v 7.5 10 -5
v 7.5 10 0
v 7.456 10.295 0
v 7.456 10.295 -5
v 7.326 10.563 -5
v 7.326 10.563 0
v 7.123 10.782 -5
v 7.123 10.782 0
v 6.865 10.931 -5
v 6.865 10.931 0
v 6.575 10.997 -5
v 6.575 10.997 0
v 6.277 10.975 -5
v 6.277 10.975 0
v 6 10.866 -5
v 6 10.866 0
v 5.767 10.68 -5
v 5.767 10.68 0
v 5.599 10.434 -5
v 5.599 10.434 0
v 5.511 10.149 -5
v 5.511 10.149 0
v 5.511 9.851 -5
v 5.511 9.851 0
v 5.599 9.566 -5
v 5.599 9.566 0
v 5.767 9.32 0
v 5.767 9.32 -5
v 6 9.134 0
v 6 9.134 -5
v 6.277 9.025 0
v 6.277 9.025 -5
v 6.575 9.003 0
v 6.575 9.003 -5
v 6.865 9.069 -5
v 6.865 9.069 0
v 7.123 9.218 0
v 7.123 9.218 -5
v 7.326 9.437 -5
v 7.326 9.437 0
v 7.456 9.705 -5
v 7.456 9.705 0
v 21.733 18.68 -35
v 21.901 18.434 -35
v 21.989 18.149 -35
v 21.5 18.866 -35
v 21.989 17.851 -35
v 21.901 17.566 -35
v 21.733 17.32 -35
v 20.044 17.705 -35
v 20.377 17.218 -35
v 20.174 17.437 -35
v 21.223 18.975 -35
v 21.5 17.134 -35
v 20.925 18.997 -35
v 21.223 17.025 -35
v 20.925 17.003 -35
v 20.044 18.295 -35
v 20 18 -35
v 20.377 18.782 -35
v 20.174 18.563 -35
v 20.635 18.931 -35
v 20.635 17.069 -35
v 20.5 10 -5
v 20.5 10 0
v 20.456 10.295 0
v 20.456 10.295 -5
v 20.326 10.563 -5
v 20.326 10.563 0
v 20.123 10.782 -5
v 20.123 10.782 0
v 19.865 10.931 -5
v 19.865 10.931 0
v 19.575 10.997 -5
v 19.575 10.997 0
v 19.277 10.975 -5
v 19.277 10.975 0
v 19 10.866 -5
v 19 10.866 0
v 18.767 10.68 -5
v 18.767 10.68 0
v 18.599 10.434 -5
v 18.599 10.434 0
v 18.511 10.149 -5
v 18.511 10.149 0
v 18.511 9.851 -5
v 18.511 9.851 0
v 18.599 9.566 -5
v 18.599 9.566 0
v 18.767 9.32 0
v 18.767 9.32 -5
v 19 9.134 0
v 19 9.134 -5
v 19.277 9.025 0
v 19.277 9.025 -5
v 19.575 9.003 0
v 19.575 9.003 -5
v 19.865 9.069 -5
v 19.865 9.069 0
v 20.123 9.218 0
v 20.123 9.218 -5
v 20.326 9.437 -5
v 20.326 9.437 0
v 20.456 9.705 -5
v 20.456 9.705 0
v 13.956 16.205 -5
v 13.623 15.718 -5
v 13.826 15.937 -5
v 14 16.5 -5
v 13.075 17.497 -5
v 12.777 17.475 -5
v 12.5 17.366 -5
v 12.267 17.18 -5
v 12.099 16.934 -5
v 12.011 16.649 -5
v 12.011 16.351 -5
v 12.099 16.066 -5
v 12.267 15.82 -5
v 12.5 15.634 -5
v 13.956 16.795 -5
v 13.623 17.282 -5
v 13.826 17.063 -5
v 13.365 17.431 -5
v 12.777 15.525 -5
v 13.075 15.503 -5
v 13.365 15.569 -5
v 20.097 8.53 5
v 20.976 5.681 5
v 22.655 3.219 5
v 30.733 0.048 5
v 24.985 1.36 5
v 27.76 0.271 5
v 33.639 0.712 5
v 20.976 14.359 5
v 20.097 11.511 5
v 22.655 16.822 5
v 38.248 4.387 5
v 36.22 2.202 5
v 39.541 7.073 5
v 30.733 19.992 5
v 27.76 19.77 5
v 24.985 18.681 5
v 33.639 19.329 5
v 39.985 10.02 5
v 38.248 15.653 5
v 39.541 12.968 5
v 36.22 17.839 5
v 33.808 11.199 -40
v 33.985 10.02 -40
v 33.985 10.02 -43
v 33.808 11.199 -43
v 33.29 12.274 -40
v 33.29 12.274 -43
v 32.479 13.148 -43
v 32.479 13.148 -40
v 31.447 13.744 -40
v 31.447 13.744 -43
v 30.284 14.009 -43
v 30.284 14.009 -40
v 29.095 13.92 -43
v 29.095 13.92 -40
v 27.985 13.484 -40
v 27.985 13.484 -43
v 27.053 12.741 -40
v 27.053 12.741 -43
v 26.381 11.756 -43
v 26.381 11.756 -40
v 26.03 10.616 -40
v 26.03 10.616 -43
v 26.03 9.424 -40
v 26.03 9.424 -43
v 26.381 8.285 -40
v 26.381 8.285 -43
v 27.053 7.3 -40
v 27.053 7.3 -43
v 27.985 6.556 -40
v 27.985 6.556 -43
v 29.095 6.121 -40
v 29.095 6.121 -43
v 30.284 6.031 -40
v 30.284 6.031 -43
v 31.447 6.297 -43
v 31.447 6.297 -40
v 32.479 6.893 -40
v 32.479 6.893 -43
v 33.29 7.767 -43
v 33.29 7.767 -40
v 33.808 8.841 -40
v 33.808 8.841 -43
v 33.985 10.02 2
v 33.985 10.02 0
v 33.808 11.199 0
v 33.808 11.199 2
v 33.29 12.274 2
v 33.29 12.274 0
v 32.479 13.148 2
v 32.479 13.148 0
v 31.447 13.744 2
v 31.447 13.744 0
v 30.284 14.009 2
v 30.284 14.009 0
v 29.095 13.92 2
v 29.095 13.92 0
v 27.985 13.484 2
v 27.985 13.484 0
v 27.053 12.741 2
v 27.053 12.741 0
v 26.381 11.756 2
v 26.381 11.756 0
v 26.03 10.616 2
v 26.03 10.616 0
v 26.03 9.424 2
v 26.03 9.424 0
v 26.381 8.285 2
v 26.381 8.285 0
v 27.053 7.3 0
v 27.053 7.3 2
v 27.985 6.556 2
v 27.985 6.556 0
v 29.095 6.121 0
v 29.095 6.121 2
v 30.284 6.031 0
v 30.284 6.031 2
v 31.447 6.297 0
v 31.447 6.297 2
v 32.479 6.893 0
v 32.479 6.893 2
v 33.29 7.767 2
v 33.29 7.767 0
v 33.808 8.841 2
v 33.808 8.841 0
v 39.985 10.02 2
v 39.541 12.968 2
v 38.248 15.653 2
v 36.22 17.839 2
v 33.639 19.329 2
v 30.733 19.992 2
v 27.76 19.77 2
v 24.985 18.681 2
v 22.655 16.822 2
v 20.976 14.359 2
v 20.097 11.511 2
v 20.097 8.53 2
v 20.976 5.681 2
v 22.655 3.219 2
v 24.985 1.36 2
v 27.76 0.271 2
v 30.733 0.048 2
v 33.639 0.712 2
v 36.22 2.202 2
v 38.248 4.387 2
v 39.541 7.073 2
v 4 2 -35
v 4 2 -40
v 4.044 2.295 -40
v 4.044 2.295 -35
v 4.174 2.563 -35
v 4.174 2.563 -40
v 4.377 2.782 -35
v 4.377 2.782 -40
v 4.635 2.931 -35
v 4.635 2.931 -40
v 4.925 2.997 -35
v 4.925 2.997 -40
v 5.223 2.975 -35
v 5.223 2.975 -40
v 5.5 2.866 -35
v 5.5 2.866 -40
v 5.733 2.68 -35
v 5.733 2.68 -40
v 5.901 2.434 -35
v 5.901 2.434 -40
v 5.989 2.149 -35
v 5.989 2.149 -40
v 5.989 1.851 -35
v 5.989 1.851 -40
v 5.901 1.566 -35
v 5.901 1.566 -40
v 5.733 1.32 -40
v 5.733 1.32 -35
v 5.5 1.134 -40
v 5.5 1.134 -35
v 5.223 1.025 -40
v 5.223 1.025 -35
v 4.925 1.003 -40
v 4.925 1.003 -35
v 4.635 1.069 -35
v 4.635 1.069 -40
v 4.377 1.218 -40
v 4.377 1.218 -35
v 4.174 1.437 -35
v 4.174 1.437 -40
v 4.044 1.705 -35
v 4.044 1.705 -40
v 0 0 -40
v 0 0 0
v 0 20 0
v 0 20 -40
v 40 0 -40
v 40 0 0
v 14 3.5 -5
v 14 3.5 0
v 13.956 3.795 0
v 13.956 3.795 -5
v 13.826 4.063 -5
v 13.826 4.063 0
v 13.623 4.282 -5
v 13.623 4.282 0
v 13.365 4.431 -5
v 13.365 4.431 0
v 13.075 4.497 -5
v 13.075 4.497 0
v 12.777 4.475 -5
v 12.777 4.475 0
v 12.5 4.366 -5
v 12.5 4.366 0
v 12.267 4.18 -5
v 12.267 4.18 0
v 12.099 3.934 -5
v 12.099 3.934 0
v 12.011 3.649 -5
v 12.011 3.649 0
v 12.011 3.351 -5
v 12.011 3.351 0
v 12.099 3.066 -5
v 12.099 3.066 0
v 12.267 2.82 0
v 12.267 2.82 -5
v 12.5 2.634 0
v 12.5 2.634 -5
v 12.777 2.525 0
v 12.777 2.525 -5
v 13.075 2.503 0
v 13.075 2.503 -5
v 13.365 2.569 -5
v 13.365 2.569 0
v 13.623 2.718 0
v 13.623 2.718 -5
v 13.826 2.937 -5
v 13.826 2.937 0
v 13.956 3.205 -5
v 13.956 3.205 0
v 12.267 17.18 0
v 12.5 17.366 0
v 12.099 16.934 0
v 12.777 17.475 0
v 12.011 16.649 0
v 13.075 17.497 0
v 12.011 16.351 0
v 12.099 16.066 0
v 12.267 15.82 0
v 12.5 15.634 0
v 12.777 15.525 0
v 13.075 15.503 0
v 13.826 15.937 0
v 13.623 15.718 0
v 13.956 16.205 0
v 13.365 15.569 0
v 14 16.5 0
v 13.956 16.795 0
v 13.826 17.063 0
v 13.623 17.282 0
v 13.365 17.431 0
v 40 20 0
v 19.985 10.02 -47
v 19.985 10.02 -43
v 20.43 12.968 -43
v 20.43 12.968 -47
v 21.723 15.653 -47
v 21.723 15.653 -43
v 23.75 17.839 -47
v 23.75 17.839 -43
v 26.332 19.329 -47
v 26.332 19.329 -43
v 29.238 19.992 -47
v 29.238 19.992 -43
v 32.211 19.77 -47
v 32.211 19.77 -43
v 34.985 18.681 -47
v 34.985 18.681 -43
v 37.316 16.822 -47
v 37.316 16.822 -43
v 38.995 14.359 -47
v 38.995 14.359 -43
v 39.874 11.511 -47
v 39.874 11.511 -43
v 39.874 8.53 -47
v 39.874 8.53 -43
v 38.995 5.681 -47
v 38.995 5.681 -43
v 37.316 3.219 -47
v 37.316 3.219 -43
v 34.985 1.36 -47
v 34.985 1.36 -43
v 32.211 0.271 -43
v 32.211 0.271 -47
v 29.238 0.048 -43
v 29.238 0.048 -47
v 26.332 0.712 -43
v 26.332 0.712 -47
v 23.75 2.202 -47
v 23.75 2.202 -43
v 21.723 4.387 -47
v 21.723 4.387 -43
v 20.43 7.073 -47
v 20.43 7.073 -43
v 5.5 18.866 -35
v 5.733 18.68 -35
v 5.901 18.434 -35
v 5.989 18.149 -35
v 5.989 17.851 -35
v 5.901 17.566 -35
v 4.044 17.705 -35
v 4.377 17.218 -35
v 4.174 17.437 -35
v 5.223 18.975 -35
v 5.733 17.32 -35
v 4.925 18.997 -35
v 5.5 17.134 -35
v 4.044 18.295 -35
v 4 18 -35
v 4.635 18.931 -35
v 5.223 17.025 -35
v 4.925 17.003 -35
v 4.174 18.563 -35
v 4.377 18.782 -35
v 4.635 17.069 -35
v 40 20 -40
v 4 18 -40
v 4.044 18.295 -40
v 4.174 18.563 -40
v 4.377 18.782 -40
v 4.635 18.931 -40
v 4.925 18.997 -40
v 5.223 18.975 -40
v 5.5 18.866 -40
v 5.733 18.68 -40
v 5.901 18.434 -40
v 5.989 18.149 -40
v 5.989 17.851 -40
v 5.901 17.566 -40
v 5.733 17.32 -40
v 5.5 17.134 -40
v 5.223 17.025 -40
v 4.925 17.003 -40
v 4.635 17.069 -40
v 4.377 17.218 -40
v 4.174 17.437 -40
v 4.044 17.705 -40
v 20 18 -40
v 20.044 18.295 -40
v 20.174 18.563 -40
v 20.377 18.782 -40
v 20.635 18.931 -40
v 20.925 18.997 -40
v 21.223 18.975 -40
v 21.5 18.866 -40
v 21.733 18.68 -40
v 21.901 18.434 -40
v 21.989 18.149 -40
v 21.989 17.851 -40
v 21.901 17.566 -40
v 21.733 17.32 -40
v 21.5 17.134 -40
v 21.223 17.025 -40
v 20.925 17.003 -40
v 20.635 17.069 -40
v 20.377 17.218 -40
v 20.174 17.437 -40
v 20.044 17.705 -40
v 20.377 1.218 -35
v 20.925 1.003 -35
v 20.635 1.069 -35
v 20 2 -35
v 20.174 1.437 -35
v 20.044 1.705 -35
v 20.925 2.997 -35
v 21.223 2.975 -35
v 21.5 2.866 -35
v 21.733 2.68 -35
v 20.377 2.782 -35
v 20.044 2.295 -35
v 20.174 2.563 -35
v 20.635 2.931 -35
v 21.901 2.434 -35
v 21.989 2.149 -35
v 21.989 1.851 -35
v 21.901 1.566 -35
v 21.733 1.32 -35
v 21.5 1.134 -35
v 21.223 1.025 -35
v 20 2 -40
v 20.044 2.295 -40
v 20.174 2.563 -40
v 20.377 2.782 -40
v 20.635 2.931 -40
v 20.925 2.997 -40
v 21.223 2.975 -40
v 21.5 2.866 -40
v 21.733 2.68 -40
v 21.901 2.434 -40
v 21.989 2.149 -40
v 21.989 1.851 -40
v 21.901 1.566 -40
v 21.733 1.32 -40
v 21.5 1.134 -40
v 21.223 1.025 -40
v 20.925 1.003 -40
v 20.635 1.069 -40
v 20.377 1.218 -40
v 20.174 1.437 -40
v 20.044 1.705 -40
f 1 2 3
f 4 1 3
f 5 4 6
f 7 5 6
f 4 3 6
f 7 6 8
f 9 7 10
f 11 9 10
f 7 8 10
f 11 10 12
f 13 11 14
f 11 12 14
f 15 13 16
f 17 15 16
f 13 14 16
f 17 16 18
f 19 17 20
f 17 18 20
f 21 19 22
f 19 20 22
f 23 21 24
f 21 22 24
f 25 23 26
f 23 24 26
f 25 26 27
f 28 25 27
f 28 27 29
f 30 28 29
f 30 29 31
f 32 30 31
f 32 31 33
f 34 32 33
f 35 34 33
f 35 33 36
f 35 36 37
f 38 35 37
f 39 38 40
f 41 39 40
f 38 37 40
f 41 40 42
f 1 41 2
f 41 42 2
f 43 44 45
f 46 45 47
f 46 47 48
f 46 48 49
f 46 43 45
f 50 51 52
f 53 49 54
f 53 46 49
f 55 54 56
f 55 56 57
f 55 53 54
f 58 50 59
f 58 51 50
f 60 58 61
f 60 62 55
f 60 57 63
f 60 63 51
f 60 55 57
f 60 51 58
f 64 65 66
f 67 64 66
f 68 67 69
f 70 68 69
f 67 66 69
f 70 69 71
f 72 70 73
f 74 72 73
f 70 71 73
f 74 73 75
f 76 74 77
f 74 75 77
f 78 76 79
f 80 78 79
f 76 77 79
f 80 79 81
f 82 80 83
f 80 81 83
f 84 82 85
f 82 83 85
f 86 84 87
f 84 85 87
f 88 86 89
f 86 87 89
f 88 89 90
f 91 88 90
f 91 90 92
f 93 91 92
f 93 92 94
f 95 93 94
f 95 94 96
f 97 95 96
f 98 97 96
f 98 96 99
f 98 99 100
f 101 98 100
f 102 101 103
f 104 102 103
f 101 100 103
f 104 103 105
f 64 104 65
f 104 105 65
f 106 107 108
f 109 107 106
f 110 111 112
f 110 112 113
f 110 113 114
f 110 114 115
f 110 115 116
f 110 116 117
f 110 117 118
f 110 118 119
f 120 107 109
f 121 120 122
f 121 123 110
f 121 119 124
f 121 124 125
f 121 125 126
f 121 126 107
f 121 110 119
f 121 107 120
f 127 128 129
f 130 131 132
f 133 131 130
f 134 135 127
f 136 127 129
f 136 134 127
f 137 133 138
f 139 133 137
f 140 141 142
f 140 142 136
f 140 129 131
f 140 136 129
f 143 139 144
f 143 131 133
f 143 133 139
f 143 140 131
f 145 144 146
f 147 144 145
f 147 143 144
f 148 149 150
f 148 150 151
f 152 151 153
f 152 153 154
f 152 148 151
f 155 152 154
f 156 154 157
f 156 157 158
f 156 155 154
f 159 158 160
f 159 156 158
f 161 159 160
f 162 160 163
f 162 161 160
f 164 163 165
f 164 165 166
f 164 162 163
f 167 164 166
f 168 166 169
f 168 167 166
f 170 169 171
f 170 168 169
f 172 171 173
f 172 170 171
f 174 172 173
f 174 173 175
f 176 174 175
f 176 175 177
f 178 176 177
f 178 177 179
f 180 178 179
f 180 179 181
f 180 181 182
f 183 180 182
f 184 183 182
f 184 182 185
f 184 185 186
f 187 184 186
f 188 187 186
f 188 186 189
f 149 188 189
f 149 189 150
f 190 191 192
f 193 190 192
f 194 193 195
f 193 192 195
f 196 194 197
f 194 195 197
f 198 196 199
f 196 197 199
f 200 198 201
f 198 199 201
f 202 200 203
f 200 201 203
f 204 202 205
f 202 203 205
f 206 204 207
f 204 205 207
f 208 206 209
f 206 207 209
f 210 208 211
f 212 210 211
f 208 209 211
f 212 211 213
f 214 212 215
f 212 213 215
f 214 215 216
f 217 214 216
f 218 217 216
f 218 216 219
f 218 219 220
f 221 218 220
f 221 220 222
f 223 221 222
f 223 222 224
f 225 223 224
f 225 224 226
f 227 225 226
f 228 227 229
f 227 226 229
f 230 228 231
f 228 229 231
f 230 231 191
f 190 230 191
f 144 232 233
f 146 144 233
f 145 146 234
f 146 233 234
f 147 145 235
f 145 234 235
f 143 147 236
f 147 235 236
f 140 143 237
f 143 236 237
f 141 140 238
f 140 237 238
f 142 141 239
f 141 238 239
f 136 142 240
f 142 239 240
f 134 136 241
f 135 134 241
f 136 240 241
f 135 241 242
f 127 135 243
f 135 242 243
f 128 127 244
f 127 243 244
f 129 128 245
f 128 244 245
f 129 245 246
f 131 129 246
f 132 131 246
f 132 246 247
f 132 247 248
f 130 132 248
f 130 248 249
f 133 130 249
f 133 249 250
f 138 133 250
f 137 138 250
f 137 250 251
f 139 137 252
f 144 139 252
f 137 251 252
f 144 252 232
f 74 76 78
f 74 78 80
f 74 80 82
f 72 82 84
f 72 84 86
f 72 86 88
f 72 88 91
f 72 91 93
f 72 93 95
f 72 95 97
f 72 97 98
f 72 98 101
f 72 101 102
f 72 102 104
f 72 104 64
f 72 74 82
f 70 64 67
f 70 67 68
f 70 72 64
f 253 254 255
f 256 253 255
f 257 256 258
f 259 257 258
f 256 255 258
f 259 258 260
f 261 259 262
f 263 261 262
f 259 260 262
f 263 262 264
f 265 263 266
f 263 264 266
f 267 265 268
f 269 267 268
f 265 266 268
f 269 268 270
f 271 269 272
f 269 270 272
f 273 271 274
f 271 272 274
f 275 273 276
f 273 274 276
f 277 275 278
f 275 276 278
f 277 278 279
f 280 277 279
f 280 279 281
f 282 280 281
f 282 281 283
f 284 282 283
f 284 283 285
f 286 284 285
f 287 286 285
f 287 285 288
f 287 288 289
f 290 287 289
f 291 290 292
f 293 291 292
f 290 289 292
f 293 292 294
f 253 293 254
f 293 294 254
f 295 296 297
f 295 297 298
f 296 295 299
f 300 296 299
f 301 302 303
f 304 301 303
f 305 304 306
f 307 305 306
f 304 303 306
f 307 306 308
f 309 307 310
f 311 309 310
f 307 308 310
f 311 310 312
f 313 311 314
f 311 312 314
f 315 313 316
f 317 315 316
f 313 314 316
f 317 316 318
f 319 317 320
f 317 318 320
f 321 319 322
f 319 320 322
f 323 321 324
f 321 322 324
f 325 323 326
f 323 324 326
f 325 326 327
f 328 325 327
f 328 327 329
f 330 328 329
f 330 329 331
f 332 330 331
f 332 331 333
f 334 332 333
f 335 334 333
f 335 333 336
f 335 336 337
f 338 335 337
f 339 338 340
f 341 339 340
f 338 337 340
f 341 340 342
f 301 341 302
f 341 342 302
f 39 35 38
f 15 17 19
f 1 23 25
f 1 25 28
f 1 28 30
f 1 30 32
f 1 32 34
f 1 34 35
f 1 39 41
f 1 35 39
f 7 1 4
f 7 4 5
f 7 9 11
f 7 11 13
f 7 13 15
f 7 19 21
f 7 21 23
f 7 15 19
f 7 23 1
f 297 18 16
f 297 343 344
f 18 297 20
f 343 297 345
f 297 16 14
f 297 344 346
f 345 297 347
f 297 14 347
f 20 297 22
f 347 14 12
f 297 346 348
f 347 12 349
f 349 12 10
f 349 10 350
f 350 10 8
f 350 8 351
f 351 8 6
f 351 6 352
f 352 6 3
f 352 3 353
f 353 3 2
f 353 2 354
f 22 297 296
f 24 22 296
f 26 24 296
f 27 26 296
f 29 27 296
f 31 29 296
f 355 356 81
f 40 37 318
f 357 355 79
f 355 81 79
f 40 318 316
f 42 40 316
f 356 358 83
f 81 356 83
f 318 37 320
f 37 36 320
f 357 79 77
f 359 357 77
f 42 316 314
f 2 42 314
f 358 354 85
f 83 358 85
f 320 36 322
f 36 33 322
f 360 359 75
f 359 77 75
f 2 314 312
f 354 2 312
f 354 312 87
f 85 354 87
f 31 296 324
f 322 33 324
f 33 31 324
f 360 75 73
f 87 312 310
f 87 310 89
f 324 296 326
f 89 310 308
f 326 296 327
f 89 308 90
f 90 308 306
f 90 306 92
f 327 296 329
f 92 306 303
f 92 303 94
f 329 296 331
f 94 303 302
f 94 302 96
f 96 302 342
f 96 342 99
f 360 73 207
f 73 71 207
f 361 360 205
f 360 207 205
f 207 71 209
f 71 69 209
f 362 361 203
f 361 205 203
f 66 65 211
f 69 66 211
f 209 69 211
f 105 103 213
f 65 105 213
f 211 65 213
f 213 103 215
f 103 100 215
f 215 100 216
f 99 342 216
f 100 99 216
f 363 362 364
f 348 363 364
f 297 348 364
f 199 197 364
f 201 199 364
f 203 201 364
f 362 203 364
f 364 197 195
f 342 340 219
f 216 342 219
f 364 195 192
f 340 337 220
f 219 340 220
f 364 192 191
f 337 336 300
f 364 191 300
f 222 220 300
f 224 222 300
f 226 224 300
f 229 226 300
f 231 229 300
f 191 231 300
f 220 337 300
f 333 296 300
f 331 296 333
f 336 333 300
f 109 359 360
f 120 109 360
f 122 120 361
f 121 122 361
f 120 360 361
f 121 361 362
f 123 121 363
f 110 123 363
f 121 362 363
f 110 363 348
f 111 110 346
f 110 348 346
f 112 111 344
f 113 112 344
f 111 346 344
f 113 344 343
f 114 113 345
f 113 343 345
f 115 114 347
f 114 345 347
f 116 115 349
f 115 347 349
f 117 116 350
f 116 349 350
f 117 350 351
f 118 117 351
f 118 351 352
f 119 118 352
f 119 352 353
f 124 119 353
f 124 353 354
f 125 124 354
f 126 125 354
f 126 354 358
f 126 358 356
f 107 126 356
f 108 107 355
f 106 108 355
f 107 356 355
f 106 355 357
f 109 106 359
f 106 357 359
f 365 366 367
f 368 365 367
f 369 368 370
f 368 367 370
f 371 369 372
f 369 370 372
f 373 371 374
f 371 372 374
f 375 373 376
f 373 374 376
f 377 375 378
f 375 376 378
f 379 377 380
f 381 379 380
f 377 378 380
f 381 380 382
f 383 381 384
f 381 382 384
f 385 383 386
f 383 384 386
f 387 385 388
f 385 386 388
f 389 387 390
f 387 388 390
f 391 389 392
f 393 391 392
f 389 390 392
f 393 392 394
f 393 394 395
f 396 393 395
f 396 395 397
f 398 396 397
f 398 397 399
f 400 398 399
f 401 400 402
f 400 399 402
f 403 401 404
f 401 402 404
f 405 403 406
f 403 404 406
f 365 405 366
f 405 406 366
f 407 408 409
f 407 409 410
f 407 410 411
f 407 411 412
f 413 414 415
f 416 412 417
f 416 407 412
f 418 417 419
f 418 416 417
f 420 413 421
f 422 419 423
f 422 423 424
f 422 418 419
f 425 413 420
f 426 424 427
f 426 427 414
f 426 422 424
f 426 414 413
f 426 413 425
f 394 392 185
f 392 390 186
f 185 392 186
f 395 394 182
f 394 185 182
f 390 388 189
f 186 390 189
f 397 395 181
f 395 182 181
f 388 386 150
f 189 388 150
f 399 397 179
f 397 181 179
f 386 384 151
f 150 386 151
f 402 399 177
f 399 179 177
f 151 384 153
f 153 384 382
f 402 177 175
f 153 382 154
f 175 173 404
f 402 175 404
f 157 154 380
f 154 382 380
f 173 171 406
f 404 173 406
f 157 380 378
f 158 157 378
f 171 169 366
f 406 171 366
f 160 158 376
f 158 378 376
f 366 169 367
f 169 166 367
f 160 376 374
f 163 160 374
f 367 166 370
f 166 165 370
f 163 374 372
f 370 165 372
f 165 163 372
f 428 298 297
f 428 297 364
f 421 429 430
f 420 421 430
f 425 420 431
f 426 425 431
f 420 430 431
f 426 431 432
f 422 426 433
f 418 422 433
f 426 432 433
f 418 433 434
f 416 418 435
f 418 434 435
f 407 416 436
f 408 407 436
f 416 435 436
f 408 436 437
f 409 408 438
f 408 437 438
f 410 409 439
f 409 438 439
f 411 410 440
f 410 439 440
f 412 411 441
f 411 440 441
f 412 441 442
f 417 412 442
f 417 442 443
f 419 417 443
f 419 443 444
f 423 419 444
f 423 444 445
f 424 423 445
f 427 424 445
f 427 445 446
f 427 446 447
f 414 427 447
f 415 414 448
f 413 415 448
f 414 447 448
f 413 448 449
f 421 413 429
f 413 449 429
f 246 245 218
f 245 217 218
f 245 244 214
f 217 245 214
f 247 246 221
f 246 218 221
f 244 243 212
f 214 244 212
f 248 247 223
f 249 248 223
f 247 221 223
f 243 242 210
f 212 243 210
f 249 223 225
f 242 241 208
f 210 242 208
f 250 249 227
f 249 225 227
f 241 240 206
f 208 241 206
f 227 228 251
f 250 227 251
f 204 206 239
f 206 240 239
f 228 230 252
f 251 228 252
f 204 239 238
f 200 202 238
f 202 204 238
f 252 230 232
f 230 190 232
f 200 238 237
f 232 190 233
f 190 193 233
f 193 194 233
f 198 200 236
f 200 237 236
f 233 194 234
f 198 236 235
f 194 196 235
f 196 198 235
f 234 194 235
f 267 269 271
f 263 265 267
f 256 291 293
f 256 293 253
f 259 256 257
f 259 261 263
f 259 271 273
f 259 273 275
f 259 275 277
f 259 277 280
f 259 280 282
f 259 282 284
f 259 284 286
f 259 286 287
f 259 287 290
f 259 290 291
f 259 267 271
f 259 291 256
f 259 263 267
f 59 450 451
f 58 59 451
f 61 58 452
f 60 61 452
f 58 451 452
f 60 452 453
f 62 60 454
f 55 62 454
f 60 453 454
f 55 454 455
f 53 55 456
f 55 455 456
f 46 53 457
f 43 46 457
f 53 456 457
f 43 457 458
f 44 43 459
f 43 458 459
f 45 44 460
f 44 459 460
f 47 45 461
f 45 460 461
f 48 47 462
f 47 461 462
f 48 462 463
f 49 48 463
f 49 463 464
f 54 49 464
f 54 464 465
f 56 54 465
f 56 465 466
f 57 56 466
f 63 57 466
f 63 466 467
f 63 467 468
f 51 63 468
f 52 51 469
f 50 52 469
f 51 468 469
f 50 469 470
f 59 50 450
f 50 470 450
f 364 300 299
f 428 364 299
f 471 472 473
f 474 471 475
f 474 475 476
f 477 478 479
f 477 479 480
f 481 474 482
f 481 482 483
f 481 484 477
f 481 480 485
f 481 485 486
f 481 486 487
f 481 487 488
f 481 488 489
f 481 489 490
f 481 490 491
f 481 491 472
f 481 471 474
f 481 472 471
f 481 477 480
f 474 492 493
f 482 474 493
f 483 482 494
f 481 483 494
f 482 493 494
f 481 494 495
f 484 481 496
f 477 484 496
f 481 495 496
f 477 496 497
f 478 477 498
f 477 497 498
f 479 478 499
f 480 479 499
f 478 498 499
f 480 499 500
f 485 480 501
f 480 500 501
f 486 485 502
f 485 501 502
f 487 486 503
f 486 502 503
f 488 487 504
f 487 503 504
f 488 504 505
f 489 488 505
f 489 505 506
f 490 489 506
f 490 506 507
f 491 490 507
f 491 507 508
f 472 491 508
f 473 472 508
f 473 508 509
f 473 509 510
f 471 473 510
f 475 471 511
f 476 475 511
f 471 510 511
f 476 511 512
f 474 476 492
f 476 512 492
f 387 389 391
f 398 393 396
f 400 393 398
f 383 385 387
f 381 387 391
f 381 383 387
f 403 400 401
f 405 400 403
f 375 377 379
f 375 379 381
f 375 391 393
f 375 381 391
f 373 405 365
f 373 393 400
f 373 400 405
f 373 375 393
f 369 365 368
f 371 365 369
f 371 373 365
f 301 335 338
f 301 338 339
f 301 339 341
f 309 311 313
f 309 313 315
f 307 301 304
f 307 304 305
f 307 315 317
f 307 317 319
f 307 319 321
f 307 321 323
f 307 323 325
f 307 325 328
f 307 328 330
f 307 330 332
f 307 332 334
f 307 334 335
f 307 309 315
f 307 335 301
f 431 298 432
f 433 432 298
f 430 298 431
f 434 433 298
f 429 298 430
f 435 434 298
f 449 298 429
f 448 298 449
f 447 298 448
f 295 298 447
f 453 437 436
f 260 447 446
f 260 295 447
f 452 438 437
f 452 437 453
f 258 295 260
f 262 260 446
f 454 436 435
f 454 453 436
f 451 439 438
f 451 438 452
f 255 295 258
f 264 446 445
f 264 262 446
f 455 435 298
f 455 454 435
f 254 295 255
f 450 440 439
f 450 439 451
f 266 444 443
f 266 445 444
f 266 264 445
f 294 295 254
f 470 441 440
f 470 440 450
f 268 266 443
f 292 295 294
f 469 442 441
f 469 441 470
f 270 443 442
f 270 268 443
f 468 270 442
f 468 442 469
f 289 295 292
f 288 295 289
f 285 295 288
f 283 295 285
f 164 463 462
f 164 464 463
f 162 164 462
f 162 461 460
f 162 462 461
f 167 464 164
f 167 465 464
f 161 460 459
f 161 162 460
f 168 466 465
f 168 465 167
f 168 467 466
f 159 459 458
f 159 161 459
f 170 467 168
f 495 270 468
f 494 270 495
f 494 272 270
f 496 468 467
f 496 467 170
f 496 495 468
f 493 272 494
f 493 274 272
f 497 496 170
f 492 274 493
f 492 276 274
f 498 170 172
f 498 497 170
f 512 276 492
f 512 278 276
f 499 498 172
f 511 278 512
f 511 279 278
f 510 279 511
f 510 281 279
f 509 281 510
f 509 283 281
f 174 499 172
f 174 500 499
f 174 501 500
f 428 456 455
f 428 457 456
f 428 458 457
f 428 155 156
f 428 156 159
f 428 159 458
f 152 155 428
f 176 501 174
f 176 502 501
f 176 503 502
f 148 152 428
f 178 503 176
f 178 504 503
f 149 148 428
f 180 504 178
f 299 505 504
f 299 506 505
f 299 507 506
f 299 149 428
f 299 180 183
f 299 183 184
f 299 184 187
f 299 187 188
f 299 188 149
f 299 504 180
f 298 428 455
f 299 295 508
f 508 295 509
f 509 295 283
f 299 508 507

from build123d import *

# Parameters (mm, degrees)
SKETCH1_W                = 40
SKETCH1_H                = 40
BOSS_EXTRUDE1_DEPTH      = 20
SKETCH2_R                = 4
BOSS_EXTRUDE2_DEPTH      = 2
BOSS_EXTRUDE2_DEPTH_BACK = 43
SKETCH3_R                = 10
BOSS_EXTRUDE3_DEPTH      = 3
SKETCH4_R                = 10
BOSS_EXTRUDE4_DEPTH      = 4
SKETCH5_R                = 1
CUT_EXTRUDE1_DEPTH       = 5
SKETCH6_R                = 1
CUT_EXTRUDE2_DEPTH       = 5


with BuildPart() as part:
    # Sketch1 → Boss-Extrude1 (new body)
    with BuildSketch(Plane(origin=(0, 0, 0), x_dir=(1, 0, 0), z_dir=(0, 1, 0))):
        with Locations((20, 20)):
            Rectangle(SKETCH1_W, SKETCH1_H)
    extrude(amount=BOSS_EXTRUDE1_DEPTH)

    # Sketch2 → Boss-Extrude2 (add, two sides)
    with BuildSketch(Plane.XY) as boss_extrude2_sk:
        with Locations((29.985325212, 10.020295376)):
            Circle(SKETCH2_R)
    extrude(amount=BOSS_EXTRUDE2_DEPTH)
    extrude(boss_extrude2_sk.sketch, amount=-BOSS_EXTRUDE2_DEPTH_BACK)

    # Sketch3 → Boss-Extrude3 (add)
    with BuildSketch(Plane.XY.offset(2)):
        with Locations((29.985325212, 10.020295376)):
            Circle(SKETCH3_R)
    extrude(amount=BOSS_EXTRUDE3_DEPTH)

    # Sketch4 → Boss-Extrude4 (add)
    with BuildSketch(Plane(origin=(0, 0, -43), x_dir=(-1, 0, 0), z_dir=(0, 0, -1))):
        with Locations((-29.985325212, 10.020295376)):
            Circle(SKETCH4_R)
    extrude(amount=BOSS_EXTRUDE4_DEPTH)

    # Sketch5 → Cut-Extrude1 (cut)
    with BuildSketch(Plane(origin=(0, 0, -40), x_dir=(-1, 0, 0), z_dir=(0, 0, -1))):
        with Locations((-5, 18)):
            Circle(SKETCH5_R)
        with Locations((-5, 2)):
            Circle(SKETCH5_R)
        with Locations((-21, 2)):
            Circle(SKETCH5_R)
        with Locations((-21, 18)):
            Circle(SKETCH5_R)
    extrude(amount=-CUT_EXTRUDE1_DEPTH, mode=Mode.SUBTRACT)

    # Sketch6 → Cut-Extrude2 (cut)
    with BuildSketch(Plane.XY):
        with Locations((13, 16.5)):
            Circle(SKETCH6_R)
        with Locations((6.5, 10)):
            Circle(SKETCH6_R)
        with Locations((13, 3.5)):
            Circle(SKETCH6_R)
        with Locations((19.5, 10)):
            Circle(SKETCH6_R)
    extrude(amount=-CUT_EXTRUDE2_DEPTH, mode=Mode.SUBTRACT)


solid = part.part
